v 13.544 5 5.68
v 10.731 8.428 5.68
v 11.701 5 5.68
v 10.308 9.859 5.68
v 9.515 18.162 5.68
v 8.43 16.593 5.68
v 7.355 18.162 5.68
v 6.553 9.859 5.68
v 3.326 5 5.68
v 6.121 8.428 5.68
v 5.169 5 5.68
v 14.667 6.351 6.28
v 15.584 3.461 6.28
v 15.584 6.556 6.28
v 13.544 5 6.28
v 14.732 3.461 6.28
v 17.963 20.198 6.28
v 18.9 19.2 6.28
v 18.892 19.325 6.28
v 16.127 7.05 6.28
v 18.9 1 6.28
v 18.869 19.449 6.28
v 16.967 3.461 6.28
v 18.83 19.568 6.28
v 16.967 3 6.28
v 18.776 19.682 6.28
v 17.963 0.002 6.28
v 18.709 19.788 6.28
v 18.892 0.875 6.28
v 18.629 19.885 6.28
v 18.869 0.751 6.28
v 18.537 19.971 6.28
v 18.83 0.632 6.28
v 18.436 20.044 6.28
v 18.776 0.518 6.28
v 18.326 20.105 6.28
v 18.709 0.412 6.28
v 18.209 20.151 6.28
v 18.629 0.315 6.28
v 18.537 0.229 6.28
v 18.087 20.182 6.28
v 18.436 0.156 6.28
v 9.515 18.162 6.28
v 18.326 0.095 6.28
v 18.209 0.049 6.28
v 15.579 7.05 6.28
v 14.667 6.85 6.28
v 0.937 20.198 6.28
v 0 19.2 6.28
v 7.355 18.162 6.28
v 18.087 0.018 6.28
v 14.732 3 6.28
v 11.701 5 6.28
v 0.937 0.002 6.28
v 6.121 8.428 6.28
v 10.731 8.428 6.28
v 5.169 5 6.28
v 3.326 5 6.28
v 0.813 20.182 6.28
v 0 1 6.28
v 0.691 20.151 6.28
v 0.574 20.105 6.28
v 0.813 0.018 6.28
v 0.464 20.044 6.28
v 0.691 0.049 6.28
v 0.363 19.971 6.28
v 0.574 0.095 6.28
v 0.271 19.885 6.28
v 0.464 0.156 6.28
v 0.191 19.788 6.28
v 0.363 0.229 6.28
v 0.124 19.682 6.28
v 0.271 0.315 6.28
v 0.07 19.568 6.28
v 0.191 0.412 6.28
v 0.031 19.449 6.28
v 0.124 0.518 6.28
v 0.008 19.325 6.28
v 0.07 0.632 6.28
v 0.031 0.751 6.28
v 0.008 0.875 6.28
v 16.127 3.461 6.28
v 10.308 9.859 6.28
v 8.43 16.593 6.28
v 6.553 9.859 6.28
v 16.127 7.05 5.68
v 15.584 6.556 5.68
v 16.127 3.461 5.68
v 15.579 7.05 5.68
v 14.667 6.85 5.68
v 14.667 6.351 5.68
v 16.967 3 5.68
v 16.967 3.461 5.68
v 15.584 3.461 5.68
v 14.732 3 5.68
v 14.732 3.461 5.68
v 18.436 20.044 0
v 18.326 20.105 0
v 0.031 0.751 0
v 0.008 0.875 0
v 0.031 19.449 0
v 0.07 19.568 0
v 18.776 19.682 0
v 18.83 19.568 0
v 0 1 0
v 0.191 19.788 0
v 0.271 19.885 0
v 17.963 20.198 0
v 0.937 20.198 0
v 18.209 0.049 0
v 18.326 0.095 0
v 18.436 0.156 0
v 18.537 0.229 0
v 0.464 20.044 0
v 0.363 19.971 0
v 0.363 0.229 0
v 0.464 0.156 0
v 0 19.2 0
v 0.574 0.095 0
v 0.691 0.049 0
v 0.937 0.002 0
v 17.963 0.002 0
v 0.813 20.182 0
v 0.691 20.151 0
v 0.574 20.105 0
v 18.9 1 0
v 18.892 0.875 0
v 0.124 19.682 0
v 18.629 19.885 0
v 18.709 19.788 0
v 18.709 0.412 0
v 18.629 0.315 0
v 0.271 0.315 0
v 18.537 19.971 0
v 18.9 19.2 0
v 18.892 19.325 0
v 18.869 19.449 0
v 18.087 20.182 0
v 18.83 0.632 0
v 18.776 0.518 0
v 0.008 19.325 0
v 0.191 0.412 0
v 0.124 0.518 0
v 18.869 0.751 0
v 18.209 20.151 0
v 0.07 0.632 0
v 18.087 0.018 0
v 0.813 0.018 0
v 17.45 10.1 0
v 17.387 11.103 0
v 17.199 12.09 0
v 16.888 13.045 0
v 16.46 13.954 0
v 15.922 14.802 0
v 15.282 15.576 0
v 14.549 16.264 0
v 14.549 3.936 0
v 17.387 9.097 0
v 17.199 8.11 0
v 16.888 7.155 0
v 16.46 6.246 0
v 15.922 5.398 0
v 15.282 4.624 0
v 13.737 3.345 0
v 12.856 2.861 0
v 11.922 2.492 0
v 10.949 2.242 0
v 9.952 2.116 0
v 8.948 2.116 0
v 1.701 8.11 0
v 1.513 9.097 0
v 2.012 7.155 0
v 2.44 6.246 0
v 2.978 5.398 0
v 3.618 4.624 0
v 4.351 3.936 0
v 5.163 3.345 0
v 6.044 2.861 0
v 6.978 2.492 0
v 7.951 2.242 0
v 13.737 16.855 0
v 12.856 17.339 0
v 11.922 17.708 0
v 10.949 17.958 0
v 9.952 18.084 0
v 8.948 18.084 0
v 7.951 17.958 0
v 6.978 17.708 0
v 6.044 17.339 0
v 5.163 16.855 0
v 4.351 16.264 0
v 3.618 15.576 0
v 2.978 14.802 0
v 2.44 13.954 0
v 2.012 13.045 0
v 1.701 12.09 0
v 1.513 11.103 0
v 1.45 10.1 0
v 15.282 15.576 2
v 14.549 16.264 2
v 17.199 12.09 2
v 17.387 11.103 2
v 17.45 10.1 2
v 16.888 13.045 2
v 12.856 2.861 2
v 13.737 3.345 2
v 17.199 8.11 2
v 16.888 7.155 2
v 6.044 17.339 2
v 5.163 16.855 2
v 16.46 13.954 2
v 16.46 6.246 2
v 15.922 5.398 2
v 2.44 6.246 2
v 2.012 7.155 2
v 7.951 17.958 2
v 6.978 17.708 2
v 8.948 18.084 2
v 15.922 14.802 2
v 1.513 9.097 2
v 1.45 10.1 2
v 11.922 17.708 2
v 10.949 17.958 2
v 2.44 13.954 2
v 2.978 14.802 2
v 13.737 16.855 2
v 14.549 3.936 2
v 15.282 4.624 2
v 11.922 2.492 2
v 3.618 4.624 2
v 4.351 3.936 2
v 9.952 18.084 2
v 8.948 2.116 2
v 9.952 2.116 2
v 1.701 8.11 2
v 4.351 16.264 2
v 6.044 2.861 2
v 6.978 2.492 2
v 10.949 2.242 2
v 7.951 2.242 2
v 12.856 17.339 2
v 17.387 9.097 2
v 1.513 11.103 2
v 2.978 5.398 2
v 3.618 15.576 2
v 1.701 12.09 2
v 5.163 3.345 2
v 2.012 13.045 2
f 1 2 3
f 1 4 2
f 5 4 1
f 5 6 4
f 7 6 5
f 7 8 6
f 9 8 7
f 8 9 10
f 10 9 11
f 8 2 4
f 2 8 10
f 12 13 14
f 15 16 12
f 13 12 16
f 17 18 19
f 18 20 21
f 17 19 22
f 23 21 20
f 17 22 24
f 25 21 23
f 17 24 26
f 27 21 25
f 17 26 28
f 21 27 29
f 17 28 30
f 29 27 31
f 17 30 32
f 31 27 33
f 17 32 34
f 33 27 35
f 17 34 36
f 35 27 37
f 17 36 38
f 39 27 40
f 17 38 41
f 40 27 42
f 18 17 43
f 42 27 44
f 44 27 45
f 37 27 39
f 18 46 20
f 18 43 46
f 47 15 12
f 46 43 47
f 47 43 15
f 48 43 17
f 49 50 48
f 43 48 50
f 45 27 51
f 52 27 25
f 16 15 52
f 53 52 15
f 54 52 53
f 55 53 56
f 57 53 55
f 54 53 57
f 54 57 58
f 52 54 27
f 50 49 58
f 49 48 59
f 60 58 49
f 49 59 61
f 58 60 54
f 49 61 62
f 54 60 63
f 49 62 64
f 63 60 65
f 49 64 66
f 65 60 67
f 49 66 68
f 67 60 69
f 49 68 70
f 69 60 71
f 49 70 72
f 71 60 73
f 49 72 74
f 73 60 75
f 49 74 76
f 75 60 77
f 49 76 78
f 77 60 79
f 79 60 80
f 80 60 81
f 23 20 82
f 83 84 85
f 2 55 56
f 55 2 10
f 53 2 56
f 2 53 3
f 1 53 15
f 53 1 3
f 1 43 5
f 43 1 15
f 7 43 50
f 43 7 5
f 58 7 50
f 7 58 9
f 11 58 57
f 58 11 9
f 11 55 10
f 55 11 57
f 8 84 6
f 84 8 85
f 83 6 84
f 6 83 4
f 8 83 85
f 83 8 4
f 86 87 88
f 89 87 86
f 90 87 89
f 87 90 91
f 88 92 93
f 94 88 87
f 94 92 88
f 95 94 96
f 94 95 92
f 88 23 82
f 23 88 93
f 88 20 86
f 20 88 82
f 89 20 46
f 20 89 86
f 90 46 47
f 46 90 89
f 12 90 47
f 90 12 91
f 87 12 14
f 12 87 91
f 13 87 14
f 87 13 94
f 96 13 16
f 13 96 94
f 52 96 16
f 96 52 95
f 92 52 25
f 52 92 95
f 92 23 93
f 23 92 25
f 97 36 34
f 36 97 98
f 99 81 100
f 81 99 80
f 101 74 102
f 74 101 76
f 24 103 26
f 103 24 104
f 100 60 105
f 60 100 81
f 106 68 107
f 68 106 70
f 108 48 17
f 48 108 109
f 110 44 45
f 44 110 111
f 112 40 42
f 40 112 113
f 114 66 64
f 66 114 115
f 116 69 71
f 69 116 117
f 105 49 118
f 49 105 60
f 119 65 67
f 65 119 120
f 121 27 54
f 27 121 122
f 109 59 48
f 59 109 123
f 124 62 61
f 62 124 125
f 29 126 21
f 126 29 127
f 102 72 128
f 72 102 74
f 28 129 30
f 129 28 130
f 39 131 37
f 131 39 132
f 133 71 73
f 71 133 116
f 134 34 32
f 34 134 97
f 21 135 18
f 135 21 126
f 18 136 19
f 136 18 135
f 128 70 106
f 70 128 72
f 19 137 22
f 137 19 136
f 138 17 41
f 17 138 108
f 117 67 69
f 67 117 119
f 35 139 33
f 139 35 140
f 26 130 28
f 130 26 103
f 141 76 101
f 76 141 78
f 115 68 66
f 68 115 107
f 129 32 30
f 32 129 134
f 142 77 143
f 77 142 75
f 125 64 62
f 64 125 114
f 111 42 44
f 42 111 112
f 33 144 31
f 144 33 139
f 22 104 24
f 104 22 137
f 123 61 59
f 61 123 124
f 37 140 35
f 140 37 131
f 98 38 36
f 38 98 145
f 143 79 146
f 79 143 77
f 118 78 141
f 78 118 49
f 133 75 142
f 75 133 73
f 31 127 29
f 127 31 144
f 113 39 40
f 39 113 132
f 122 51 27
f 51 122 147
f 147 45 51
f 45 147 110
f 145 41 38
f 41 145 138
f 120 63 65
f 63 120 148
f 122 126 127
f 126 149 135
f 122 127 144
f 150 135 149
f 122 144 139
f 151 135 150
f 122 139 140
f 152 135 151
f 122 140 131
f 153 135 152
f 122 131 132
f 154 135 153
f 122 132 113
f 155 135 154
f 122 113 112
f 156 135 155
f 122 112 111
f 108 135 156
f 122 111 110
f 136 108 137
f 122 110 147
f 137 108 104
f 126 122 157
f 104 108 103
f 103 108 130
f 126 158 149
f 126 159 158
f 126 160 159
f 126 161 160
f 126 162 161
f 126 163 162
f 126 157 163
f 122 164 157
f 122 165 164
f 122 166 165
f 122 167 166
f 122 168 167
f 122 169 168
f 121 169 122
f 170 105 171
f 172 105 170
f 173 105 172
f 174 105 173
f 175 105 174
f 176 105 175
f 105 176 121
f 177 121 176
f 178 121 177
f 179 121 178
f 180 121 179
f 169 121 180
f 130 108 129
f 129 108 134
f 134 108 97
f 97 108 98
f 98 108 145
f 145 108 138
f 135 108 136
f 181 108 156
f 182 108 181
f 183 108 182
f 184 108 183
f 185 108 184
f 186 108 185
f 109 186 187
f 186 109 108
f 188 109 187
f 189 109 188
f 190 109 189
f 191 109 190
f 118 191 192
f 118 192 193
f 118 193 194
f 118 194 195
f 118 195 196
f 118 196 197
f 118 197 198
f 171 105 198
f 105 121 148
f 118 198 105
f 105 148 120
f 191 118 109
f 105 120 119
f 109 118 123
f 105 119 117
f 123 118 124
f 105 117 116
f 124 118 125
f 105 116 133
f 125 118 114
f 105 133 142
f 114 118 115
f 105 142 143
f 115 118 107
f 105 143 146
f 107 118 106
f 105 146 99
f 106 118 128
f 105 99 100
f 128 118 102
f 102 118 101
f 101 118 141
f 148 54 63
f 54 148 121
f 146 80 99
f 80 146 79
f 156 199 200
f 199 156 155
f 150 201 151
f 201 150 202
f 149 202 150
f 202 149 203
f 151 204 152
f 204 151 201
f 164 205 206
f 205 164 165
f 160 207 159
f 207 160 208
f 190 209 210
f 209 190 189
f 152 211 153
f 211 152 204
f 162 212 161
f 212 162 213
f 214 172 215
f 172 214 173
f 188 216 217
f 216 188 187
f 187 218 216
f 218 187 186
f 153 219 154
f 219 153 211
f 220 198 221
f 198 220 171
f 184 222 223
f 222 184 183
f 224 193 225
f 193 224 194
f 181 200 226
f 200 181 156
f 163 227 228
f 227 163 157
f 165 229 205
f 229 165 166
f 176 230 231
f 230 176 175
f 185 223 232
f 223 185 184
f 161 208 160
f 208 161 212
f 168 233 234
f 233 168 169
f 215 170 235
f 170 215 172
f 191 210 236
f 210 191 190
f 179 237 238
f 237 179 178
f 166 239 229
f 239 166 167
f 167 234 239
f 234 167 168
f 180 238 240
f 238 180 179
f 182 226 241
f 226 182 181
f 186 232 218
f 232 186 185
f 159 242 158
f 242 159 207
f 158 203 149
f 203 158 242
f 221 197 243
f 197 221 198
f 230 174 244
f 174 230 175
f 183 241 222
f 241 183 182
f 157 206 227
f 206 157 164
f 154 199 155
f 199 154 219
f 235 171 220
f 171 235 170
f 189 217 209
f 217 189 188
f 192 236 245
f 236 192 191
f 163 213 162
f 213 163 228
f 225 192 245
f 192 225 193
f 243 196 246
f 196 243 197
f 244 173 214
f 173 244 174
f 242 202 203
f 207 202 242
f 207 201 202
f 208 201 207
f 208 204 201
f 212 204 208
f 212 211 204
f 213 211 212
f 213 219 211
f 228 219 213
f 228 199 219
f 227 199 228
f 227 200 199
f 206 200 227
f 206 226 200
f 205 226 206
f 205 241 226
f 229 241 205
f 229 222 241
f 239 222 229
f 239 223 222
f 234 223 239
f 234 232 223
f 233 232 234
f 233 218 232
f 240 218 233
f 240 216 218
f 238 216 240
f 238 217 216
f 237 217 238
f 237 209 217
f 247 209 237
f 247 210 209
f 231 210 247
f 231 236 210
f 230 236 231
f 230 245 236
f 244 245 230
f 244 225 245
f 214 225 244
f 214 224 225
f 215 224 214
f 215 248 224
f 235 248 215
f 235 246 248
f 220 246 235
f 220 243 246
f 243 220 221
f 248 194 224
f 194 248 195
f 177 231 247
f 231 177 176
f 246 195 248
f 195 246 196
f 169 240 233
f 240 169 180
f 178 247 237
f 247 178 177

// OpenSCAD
// [FL_INDEX: keywords="openscad, 3d_parametric, Scrabble_tile_generator, csg_solid" | COT="Parametric OpenSCAD design from 3DCodeverse"]
// Title: Scrabble tile generator

// scrabble tile generator, Glyn Cowles, revised Oct 2018
letter="A";
number="1";
sfont="Consolas";
/* [Hidden] */
ht=6.28; // tile height
x=18.9;  //  size
y=20.2;
dp=.6; // letter depth		
lz=13; // letter size;
nz=4; // number size  
$fn=50;
//----------------------------------------------------------------------

difference() {
	roundedRect([x,y,ht],1);
	if (number == "10") {
		#translate([1.5,5,ht-dp]) linear_extrude(dp)
            text(letter,size=lz,font=sfont);	
		#translate([13,2.5,ht-dp]) linear_extrude(dp)
            text(number,size=nz-1,font=sfont);
	}
	else {
			#translate([3,5,ht-dp]) linear_extrude(dp)
            text(letter,size=lz,font=sfont);	
		#translate([14,3,ht-dp]) linear_extrude(dp)
            text(number,size=nz,font=sfont);
	}
	translate([x/2,y/2,-2]) cylinder(r=8,h=4);
}

//----------------------------------------------------------------------
module roundedRect(size, radius) {
x = size[0];
y = size[1];
z = size[2];

linear_extrude(z)
hull() {
translate([radius, radius, 0])
circle(r=radius);

translate([x - radius, radius, 0])
circle(r=radius);

translate([x - radius, y - radius, 0])
circle(r=radius);

translate([radius, y - radius, 0])
circle(r=radius);
}
}
